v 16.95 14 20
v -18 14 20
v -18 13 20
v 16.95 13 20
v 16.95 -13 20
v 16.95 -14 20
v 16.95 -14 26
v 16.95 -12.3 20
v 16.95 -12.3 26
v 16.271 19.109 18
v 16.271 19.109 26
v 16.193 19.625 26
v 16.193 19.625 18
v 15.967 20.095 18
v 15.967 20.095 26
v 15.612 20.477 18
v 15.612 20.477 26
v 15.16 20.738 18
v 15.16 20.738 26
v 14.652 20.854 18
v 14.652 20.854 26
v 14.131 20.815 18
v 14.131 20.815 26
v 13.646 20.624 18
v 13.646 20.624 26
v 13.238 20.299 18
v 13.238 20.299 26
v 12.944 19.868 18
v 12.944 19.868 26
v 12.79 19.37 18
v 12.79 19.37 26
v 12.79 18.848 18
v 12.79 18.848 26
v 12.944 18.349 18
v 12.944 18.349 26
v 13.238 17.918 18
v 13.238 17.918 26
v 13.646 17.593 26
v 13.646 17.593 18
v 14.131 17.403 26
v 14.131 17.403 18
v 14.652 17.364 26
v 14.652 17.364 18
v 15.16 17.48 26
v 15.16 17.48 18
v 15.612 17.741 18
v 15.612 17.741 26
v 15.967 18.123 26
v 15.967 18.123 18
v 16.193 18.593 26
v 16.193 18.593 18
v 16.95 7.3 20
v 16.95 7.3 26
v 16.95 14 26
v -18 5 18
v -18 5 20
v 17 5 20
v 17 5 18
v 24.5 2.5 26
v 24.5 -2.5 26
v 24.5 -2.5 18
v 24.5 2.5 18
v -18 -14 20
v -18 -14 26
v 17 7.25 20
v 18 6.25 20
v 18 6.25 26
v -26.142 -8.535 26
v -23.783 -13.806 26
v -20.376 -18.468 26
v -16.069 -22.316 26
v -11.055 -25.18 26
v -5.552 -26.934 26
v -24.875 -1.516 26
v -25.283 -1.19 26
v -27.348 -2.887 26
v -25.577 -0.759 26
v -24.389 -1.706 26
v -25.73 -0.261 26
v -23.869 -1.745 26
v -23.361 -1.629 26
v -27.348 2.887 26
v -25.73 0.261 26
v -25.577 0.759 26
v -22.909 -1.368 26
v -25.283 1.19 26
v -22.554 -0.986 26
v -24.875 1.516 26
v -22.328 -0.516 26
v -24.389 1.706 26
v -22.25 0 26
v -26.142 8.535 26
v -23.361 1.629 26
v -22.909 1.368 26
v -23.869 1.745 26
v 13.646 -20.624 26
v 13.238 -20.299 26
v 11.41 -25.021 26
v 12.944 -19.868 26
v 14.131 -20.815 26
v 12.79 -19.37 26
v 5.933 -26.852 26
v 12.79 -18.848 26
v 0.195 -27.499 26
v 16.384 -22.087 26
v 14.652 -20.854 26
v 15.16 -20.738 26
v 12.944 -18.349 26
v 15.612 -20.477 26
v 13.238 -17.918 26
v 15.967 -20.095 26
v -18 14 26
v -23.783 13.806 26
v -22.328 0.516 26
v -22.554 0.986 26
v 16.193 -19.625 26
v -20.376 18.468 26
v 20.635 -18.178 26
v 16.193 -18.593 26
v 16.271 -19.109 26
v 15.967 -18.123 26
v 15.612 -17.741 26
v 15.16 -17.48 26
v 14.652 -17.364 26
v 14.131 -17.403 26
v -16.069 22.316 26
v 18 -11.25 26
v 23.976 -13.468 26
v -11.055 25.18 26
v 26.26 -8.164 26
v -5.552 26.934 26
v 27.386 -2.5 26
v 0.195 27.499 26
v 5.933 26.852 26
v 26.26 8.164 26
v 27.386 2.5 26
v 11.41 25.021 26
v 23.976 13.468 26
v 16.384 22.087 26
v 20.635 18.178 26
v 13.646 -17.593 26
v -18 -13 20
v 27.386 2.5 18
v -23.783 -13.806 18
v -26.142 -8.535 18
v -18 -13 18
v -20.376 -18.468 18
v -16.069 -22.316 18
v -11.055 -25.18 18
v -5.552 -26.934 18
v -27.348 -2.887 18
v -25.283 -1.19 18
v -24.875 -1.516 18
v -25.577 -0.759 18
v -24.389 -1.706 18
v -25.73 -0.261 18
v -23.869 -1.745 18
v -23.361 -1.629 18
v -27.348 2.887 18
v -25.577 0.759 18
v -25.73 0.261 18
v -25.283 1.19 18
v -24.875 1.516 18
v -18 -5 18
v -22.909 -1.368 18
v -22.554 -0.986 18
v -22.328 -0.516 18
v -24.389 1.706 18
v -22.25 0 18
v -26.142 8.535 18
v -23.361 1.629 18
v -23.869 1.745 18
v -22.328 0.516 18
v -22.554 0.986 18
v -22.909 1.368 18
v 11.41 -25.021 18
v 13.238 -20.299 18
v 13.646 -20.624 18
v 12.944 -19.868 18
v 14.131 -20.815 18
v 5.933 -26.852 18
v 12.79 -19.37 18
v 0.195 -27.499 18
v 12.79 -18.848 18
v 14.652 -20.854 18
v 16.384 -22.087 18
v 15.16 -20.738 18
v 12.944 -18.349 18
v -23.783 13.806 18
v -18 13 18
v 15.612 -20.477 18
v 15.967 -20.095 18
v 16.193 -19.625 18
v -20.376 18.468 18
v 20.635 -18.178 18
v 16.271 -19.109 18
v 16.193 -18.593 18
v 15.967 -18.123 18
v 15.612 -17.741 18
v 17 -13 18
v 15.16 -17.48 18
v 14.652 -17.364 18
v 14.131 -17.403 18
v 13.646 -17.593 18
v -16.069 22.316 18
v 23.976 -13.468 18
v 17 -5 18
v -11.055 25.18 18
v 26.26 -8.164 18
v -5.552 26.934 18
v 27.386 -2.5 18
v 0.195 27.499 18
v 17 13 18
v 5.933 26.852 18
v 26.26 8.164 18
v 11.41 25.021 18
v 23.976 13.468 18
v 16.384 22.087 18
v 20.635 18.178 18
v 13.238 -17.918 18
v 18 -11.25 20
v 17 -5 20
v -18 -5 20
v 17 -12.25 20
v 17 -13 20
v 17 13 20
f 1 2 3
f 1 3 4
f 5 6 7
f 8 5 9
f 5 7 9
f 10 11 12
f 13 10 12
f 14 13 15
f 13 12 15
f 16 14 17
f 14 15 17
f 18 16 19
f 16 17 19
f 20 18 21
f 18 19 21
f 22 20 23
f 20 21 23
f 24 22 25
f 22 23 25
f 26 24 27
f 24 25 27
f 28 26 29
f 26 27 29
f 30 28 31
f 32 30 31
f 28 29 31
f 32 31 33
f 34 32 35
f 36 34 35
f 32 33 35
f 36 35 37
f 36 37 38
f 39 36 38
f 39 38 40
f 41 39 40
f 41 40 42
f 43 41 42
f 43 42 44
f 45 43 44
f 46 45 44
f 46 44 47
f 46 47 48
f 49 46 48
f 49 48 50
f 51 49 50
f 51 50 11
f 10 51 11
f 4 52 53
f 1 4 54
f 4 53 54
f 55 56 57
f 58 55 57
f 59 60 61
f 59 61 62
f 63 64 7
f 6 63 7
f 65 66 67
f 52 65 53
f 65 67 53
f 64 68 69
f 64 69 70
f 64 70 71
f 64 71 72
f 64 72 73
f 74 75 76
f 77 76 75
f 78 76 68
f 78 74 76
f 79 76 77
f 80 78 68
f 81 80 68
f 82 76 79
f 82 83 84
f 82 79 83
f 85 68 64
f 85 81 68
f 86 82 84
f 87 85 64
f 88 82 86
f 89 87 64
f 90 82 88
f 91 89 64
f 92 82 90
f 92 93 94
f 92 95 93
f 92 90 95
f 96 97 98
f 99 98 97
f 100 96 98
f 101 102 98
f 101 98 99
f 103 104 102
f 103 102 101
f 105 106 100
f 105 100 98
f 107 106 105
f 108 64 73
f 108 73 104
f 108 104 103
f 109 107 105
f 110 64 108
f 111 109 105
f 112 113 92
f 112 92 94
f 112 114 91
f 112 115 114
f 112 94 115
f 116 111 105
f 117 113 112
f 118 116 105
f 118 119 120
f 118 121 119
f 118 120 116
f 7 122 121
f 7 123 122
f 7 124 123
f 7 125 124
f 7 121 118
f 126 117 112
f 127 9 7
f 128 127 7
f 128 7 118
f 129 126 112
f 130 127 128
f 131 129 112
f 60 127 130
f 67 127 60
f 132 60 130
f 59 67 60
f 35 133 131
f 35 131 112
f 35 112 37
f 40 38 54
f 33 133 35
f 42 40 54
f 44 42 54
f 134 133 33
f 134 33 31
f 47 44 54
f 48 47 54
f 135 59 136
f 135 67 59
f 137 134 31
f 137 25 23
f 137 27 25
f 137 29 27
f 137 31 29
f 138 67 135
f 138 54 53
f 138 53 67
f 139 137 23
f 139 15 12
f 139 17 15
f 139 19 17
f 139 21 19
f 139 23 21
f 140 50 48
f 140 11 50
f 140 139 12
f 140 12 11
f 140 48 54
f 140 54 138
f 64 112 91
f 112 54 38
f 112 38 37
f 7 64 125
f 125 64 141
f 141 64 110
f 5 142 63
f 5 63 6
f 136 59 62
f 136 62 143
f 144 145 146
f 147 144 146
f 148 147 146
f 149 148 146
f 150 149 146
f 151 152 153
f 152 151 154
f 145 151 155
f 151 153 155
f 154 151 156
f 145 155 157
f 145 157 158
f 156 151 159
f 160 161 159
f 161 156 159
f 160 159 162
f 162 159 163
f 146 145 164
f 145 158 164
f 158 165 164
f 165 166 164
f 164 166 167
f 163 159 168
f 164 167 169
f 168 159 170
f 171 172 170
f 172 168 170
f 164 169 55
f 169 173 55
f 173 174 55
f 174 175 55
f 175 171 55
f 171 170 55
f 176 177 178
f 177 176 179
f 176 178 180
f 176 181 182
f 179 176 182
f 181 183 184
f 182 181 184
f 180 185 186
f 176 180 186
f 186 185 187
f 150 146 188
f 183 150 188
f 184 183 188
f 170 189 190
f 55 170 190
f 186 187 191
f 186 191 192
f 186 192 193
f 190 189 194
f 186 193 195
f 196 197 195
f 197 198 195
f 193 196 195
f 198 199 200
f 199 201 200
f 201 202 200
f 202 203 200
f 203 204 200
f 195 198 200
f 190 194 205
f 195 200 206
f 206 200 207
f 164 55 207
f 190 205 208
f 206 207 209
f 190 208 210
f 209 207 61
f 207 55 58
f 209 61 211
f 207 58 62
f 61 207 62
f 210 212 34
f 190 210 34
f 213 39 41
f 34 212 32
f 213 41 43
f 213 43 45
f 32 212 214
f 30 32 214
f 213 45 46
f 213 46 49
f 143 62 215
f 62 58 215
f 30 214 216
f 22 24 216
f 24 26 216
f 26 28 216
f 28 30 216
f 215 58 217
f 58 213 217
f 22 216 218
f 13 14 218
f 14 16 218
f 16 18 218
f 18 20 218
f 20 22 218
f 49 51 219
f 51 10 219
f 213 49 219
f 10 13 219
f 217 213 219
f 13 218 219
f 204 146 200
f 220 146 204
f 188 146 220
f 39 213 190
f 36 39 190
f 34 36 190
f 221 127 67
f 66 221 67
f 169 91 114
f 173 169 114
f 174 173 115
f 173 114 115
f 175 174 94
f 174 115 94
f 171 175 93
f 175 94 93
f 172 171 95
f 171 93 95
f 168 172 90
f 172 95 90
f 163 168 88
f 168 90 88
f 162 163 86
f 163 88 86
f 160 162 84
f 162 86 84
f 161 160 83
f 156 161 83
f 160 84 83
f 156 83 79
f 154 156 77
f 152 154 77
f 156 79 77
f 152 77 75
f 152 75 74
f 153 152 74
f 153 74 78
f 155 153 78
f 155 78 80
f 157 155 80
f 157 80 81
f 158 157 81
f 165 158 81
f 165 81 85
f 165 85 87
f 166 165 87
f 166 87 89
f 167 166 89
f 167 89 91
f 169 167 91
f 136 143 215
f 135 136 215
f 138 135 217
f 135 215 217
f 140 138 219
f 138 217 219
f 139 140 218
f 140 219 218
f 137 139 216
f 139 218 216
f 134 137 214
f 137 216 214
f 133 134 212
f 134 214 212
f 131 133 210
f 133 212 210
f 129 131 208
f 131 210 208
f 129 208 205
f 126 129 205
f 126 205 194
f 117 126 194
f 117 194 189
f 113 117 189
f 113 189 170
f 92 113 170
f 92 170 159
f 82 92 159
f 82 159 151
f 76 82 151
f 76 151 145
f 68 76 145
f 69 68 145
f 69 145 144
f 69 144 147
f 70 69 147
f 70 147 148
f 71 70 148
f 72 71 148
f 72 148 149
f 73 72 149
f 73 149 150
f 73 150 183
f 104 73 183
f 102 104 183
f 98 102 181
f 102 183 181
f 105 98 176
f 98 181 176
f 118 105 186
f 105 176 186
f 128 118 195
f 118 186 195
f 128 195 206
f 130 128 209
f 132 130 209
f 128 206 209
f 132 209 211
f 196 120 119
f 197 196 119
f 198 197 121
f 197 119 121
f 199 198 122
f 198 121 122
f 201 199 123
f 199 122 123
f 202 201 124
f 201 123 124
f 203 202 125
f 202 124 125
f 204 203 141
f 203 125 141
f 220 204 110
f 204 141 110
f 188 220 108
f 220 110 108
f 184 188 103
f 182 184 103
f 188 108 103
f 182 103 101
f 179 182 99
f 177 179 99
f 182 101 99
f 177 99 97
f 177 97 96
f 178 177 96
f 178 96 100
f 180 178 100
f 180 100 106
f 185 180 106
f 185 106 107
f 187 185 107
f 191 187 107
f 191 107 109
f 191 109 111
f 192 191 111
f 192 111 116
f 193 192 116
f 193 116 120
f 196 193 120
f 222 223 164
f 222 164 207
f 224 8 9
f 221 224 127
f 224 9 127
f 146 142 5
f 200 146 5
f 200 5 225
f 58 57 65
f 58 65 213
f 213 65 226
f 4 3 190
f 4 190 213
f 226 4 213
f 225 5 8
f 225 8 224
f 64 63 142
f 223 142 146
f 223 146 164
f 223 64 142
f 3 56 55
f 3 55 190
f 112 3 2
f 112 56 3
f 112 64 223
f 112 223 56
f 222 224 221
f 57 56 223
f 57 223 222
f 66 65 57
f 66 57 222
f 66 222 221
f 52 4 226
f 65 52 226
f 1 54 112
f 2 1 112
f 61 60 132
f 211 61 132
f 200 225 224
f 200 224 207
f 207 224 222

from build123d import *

# Parameters (mm, degrees)
SKETCH_R        = 27.5
PAD_DEPTH       = 8
POCKET_DEPTH    = 6
SKETCH013_R     = 1.75
POCKET006_DEPTH = 10
SKETCH021_W     = 35
SKETCH021_H     = 8
POCKET013_DEPTH = 2
SKETCH022_W     = 3
SKETCH022_H     = 5
POCKET014_DEPTH = 13


with BuildPart() as part:
    # Sketch → Pad (new body)
    with BuildSketch(Plane.XY):
        Circle(SKETCH_R)
    extrude(amount=PAD_DEPTH)

    # Sketch002 (on Face3 of Pad) → Pocket (cut)
    with BuildSketch(Plane.XY.offset(8)):
        Polygon((-18, 14), (-18, -14), (16.95, -14), (16.95, -12.3), (18, -11.25), (18, 6.25), (16.95, 7.3), (16.95, 14), align=None)
    extrude(amount=-POCKET_DEPTH, mode=Mode.SUBTRACT)

    # Sketch013 (on Face3 of Pocket) → Pocket006 (cut)
    with BuildSketch(Plane.XY.offset(8)):
        with Locations((-24, 0)):
            Circle(SKETCH013_R)
        with Locations((14.520833, 19.108778)):
            Circle(SKETCH013_R)
        with Locations((14.520833, -19.108778)):
            Circle(SKETCH013_R)
    extrude(amount=-POCKET006_DEPTH, mode=Mode.SUBTRACT)

    # Sketch021 (on Face15 of Pocket006) → Pocket013 (cut)
    with BuildSketch(Plane.XY.offset(2)):
        with Locations((-0.5, 9)):
            Rectangle(SKETCH021_W, SKETCH021_H)
        with Locations((-0.5, -9)):
            Rectangle(SKETCH021_W, SKETCH021_H)
    extrude(amount=-POCKET013_DEPTH, mode=Mode.SUBTRACT)

    # Sketch022 (on Face3 of Pocket013) → Pocket014 (cut)
    with BuildSketch(Plane.XY.offset(8)):
        with Locations((26, 0)):
            Rectangle(SKETCH022_W, SKETCH022_H)
    extrude(amount=-POCKET014_DEPTH, mode=Mode.SUBTRACT)


with BuildPart() as part_1:
    # Body placement: moved
    add(part.part.moved(Location((0, 0, 18))))


solid = part_1.part
